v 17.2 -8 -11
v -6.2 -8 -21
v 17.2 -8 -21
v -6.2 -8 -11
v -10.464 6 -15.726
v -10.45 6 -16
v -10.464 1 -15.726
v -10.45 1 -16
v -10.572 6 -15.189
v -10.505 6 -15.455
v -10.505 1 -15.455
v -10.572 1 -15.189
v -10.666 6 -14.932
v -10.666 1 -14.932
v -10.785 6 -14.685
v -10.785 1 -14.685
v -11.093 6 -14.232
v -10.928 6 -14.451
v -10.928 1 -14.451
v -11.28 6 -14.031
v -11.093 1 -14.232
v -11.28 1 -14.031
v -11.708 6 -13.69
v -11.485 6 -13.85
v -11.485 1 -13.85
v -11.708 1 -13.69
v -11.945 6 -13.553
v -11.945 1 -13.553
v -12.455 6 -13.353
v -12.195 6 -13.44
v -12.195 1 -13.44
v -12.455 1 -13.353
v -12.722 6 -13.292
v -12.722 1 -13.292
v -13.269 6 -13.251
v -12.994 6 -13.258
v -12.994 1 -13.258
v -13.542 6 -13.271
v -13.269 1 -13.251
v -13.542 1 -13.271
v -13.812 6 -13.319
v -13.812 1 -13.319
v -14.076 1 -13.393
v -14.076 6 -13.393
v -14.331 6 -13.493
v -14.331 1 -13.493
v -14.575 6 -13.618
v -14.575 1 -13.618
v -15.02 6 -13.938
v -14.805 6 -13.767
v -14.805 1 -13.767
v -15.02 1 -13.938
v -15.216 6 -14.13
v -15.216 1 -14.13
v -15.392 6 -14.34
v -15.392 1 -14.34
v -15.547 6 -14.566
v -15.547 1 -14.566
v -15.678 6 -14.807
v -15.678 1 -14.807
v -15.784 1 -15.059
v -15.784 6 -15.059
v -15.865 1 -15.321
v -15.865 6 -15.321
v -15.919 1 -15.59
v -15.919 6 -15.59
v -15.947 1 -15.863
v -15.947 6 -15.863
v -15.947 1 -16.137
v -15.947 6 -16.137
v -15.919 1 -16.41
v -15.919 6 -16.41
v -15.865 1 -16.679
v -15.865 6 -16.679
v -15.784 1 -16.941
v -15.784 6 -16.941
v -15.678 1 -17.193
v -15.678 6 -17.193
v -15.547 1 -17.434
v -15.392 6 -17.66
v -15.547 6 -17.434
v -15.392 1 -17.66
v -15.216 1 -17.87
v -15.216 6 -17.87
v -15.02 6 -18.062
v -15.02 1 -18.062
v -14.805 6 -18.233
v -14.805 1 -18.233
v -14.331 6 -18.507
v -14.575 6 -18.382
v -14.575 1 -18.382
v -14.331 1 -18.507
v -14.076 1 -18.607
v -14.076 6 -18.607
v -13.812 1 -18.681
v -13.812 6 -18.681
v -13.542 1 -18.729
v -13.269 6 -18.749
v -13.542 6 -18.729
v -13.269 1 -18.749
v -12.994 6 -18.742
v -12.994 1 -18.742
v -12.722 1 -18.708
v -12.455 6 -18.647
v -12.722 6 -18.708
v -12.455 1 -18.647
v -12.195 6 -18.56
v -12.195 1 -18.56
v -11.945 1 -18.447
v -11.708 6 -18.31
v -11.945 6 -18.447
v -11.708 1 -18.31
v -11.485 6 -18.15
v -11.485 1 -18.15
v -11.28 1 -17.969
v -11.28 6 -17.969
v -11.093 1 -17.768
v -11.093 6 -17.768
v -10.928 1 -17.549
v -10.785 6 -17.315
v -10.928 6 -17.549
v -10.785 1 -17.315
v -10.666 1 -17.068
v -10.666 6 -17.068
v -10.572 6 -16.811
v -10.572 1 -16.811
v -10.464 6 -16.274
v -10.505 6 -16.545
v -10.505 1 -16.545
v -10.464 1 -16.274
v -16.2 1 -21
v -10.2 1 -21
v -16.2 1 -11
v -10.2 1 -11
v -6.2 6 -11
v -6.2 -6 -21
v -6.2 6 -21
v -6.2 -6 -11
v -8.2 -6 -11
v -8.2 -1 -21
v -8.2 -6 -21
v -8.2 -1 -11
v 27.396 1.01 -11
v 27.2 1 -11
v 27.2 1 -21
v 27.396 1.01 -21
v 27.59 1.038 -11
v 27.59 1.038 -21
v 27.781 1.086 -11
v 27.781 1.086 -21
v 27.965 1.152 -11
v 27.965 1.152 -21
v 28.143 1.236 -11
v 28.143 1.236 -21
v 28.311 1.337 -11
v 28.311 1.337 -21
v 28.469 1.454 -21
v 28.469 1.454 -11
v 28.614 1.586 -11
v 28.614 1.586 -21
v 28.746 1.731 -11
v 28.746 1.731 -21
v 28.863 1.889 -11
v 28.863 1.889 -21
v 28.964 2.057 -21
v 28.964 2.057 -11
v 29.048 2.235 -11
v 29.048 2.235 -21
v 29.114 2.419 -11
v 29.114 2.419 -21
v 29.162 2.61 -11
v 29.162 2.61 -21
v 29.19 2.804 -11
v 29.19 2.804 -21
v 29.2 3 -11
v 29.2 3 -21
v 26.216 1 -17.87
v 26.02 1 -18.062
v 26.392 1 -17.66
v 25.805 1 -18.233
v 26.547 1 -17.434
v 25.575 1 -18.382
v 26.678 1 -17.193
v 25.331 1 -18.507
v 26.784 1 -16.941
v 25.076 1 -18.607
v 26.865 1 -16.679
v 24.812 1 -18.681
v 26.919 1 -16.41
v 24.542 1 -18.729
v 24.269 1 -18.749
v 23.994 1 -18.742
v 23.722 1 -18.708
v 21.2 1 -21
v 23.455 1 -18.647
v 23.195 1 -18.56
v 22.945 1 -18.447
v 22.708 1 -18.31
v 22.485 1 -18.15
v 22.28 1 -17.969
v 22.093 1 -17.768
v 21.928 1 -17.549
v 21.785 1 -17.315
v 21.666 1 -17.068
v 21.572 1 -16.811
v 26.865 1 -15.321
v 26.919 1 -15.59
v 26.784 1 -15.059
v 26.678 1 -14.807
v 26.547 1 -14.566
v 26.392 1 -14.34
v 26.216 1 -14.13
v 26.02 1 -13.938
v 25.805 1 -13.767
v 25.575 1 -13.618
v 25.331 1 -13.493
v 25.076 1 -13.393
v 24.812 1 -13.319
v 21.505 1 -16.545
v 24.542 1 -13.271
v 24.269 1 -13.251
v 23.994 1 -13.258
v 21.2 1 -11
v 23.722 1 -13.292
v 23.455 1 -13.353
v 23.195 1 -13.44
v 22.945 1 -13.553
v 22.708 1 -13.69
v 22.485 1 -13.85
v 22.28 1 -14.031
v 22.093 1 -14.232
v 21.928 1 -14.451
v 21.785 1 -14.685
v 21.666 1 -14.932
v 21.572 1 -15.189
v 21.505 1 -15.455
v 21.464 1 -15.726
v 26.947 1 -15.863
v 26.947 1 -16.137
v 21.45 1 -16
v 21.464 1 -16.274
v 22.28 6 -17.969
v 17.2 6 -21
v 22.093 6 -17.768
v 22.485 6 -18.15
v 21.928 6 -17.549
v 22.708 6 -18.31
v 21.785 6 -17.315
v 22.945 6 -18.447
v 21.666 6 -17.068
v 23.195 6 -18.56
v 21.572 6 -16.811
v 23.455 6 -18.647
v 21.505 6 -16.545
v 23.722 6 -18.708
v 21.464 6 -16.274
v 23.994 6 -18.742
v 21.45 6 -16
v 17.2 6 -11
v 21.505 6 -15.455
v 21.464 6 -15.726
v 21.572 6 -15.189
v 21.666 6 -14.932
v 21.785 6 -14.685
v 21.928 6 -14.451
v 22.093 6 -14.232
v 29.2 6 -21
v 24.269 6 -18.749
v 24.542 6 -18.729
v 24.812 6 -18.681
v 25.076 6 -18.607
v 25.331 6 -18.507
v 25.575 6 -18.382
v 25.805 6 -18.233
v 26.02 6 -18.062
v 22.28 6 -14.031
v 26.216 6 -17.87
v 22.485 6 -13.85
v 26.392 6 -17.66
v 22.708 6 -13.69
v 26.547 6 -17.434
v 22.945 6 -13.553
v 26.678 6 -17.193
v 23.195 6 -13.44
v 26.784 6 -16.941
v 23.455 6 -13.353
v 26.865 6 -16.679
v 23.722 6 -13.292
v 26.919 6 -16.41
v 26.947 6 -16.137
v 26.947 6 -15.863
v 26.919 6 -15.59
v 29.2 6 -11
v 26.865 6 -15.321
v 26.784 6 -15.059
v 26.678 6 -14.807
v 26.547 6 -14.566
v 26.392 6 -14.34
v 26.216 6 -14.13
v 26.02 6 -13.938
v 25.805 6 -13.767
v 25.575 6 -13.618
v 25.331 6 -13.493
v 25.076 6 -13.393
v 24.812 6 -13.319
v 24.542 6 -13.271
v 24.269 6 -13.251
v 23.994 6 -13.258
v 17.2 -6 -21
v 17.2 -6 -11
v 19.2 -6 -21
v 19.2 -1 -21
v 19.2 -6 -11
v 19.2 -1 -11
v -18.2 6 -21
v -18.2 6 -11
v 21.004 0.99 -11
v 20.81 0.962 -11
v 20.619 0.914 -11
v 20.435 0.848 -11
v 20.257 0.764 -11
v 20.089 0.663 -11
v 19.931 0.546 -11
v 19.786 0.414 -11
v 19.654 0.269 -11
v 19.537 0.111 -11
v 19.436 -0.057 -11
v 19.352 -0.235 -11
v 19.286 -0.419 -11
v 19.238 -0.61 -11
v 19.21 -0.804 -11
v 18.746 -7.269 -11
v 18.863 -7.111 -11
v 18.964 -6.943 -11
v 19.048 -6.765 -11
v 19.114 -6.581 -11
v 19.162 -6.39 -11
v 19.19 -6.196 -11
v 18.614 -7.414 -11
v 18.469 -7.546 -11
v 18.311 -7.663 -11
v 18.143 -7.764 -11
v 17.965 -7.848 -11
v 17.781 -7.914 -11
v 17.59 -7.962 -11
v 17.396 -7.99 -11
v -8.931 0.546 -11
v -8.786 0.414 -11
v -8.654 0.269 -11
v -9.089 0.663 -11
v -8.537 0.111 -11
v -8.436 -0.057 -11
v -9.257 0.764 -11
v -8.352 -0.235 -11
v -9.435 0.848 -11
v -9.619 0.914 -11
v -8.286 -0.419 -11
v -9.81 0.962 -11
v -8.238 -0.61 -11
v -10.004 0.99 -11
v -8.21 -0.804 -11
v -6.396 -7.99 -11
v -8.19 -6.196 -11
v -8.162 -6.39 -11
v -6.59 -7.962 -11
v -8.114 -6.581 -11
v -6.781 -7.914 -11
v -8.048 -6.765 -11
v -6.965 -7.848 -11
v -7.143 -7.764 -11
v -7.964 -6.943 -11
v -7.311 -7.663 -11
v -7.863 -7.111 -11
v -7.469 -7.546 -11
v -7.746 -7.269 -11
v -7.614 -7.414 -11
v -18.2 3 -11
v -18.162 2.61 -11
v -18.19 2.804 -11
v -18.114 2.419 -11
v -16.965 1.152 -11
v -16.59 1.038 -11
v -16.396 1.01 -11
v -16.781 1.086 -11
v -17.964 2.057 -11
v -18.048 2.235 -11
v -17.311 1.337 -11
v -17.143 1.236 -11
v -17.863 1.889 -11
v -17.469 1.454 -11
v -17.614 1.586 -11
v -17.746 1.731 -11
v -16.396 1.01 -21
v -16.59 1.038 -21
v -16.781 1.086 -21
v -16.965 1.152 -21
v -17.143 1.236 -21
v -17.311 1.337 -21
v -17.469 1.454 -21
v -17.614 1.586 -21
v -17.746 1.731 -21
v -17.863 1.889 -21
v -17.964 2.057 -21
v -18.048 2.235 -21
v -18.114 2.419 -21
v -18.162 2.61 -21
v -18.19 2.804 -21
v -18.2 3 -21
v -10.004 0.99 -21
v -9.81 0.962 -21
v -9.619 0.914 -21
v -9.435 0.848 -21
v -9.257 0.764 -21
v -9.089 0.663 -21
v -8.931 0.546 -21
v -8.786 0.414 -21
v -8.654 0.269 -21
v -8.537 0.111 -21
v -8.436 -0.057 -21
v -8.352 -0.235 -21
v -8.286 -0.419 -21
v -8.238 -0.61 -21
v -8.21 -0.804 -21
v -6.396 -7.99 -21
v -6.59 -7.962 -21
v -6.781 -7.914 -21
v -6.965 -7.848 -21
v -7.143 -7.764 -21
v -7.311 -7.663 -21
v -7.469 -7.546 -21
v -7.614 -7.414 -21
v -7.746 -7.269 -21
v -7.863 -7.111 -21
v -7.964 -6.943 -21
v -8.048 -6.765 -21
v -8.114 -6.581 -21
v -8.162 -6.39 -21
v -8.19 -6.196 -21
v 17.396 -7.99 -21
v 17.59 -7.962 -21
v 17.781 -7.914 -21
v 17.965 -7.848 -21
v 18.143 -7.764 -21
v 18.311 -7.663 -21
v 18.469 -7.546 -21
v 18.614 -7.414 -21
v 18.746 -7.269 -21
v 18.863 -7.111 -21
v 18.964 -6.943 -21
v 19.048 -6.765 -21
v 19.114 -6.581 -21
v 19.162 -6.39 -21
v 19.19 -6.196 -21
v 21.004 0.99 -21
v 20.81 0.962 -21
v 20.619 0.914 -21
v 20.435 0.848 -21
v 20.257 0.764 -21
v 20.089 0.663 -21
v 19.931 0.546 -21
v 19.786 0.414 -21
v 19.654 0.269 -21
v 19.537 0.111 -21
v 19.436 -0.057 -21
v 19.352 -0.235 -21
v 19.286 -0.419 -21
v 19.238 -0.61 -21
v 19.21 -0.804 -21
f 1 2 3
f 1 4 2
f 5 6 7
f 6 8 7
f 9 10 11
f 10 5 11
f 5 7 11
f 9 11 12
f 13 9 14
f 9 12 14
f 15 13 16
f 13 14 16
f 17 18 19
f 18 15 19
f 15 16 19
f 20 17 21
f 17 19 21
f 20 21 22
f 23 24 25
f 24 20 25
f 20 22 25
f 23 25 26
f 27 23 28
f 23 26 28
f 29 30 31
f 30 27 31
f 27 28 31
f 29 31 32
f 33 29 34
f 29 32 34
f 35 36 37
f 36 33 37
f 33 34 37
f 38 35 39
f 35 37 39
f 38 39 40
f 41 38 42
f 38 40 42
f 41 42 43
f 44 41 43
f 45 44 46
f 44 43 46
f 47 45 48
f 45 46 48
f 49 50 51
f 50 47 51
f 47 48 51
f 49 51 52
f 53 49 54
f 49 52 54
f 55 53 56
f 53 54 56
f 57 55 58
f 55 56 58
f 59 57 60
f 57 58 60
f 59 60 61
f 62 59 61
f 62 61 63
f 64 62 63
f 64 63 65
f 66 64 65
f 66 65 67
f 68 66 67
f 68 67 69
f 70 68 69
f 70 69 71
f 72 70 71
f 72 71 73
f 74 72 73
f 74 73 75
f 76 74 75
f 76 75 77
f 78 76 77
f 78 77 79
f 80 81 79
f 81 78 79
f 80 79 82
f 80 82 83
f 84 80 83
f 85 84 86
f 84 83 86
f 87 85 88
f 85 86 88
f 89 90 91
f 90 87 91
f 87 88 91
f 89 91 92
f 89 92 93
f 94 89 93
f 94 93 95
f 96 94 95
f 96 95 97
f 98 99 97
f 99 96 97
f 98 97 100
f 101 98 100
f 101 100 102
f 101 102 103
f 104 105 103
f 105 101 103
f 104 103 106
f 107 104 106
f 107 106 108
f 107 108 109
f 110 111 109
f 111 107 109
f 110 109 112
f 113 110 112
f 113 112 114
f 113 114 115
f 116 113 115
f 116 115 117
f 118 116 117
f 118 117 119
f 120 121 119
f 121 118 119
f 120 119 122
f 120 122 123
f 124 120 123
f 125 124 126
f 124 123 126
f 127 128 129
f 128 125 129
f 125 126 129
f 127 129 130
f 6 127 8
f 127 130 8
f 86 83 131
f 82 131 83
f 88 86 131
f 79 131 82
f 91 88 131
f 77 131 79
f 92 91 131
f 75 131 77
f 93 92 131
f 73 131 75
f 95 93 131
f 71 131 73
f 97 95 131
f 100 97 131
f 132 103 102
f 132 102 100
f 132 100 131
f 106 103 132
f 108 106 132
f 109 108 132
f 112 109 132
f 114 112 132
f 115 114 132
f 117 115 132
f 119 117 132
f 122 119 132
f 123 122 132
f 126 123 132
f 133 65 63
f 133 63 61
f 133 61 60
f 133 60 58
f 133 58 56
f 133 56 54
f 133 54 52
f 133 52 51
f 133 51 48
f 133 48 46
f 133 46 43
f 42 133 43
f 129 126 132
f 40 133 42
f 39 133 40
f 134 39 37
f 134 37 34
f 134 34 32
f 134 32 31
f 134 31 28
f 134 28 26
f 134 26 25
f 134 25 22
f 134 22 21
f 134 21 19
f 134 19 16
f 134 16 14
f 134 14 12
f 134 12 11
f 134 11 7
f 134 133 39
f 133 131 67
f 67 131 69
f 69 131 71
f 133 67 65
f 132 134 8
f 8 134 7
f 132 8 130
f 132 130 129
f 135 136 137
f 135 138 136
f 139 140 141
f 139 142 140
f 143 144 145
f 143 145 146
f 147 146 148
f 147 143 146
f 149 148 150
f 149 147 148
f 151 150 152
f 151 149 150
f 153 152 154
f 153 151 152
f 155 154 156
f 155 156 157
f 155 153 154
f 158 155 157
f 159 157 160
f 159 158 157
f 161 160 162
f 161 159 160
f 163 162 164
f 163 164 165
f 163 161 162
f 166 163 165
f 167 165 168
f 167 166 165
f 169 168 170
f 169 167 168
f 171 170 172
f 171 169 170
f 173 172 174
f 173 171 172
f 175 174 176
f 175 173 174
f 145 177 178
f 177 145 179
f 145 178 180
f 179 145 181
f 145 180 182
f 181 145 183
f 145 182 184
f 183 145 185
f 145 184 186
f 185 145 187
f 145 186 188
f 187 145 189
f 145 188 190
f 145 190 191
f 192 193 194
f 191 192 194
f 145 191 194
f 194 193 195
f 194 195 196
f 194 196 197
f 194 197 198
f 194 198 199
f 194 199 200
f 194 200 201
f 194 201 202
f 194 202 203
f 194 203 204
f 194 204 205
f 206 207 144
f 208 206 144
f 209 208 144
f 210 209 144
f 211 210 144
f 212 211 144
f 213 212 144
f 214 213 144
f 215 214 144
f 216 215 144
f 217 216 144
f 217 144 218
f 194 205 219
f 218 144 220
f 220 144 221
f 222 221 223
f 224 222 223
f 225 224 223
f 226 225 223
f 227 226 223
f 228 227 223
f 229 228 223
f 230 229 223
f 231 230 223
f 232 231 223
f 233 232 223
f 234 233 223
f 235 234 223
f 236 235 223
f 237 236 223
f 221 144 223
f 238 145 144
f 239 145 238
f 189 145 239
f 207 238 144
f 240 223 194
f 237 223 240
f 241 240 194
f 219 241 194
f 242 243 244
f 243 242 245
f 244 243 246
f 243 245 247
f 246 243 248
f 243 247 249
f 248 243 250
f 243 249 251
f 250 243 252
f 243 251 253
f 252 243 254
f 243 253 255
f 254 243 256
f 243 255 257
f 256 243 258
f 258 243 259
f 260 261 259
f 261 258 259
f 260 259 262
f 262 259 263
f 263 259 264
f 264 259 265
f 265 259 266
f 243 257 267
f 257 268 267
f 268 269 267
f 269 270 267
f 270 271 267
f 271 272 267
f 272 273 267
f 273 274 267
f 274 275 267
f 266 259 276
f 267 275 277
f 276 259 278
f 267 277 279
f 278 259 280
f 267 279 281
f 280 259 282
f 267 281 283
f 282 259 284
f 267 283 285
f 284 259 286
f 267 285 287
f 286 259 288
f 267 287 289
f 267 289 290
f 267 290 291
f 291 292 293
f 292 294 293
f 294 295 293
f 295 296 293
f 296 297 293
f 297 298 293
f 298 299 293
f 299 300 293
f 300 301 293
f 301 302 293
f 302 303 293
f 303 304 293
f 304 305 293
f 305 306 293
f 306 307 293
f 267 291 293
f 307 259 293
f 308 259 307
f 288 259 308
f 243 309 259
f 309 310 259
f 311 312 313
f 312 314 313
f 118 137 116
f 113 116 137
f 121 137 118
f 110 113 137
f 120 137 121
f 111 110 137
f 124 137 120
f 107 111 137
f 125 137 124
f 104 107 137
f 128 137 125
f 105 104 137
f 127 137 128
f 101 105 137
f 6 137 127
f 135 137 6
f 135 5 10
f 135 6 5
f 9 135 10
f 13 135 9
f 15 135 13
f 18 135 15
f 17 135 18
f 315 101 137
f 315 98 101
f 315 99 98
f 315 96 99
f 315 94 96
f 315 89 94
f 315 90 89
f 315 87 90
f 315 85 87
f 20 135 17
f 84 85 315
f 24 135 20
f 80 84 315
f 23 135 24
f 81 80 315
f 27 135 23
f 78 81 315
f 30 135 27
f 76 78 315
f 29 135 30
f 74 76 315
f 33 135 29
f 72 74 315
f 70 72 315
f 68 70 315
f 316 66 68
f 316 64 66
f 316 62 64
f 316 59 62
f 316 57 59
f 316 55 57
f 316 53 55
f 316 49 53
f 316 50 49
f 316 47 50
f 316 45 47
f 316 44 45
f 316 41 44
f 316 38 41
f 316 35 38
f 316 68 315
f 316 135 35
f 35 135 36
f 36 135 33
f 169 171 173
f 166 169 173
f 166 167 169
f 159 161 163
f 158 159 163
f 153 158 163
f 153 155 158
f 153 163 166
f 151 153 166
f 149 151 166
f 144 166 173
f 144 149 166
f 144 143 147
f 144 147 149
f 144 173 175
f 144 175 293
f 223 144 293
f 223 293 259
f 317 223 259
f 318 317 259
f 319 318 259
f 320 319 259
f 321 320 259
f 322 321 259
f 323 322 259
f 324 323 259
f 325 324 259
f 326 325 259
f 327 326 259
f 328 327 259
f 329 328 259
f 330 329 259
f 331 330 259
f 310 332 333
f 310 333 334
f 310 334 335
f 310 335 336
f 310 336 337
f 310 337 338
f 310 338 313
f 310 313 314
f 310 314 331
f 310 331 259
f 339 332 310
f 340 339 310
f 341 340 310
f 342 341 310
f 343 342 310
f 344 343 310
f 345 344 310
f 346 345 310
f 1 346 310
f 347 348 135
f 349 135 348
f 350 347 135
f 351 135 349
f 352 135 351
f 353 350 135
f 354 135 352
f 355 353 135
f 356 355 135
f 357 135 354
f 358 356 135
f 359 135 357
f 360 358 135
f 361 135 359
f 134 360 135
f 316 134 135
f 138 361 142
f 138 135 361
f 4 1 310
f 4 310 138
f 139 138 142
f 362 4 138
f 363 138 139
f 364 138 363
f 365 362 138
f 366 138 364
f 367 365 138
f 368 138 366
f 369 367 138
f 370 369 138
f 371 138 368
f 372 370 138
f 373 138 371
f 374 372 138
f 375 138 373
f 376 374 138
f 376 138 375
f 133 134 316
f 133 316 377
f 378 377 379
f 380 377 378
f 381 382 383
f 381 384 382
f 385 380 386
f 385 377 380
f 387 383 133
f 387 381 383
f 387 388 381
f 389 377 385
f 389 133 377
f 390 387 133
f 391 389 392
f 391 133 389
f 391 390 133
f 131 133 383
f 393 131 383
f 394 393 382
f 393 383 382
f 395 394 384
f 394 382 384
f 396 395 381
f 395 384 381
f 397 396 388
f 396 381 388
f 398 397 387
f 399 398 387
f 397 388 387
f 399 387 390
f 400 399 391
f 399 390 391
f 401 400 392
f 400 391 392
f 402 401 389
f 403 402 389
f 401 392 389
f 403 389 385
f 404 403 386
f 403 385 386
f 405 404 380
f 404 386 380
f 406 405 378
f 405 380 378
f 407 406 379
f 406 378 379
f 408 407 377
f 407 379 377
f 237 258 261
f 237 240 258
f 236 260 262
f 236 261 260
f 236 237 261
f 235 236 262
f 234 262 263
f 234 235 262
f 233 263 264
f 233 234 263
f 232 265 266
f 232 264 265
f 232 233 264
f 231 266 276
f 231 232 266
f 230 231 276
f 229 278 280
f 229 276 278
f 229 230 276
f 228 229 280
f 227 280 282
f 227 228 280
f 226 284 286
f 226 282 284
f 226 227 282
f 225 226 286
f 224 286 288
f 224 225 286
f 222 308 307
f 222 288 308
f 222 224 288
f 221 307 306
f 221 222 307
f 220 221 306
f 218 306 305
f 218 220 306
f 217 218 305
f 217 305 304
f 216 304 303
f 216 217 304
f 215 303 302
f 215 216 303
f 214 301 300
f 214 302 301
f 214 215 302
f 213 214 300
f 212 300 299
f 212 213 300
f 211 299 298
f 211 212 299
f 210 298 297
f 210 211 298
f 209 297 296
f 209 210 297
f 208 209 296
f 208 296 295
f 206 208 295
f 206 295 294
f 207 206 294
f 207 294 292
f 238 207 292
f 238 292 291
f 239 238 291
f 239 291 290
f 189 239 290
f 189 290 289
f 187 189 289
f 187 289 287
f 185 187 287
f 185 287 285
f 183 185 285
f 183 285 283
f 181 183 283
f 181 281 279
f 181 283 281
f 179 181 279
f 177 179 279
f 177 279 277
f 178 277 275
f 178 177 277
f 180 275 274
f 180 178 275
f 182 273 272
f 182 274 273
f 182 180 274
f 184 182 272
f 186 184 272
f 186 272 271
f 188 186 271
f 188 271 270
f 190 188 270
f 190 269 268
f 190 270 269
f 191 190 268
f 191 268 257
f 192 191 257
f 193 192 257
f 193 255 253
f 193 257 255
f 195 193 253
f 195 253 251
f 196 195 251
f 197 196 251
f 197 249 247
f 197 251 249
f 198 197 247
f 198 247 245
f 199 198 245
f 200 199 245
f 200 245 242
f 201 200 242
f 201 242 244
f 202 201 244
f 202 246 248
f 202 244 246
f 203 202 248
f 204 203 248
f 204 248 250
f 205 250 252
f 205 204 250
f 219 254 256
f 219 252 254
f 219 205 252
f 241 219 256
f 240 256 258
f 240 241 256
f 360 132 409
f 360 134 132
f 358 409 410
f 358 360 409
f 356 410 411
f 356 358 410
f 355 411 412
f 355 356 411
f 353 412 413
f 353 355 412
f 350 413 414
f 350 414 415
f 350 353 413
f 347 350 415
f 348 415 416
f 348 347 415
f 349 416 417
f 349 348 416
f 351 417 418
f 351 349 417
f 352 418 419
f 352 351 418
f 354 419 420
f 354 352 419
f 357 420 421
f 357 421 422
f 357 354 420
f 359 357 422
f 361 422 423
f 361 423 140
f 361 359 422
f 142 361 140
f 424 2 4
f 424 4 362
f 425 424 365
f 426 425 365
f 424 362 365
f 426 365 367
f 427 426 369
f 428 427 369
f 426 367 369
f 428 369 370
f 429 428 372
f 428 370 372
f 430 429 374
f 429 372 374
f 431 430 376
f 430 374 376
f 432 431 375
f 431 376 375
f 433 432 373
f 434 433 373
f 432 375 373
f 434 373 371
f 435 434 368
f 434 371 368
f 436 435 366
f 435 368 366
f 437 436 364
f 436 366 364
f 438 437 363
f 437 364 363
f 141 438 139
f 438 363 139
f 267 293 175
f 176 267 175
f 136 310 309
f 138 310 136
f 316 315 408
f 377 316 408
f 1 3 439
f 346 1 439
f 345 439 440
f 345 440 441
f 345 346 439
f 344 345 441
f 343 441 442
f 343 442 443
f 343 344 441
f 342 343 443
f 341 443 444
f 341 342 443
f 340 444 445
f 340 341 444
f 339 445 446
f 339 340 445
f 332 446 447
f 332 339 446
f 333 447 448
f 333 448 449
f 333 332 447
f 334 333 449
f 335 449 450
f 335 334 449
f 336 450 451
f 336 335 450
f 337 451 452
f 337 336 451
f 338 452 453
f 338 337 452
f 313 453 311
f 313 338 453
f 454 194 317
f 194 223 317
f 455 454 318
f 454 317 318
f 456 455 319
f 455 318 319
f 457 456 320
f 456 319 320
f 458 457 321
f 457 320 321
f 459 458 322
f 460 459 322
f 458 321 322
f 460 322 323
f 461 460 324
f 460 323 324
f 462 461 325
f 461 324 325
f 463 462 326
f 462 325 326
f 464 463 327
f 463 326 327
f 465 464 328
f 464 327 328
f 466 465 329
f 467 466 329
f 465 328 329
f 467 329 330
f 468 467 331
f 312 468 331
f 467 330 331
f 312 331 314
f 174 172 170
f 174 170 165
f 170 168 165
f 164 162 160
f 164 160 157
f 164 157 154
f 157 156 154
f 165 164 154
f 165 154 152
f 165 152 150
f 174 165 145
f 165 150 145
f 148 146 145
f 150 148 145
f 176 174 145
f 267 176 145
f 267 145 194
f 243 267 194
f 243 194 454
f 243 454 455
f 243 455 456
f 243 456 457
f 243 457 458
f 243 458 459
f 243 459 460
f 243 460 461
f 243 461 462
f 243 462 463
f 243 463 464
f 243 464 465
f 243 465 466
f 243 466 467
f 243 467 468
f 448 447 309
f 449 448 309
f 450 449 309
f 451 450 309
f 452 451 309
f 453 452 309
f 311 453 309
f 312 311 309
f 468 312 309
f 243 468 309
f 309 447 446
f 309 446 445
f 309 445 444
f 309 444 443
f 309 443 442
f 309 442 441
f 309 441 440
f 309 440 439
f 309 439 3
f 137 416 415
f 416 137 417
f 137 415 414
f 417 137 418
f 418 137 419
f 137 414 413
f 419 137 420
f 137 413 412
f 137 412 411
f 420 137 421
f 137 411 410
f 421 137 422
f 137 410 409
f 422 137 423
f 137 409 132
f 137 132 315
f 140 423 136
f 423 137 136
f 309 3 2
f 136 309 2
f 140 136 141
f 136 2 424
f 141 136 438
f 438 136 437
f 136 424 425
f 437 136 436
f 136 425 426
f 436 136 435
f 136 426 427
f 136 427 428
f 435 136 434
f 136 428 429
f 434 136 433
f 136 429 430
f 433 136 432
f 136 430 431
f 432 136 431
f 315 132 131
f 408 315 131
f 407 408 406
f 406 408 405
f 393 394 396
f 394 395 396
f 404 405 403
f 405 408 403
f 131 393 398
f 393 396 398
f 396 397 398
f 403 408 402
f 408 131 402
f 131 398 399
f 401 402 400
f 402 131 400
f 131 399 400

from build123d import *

# Parameters (mm, degrees)
PAD053_DEPTH            = 5
SKETCH104_R             = 2.75
POCKET052_DEPTH         = 8.001
POCKET052_DEPTH_BACK    = 6.001
BODY032_PLACEMENT_ANGLE = 180


with BuildPart() as part:
    # Sketch103 → Pad053 (new body, symmetric)
    with BuildSketch(Plane(origin=(6, -6, 0), x_dir=(1, 0, 0), z_dir=(0, 0, 1))):
        with BuildLine():
            Line((-21.7, 5), (-15.7, 5))
            ThreePointArc((-15.7, 5), (-14.2857864376, 5.5857864376), (-13.7, 7))
            Line((-13.7, 7), (-13.7, 12))
            ThreePointArc((-11.7, 14), (-13.1142135624, 13.4142135624), (-13.7, 12))
            Line((-11.7, 14), (0, 14))
            Line((0, 14), (0, 12))
            Line((0, 12), (-11.7, 12))
            Line((-11.7, 12), (-11.7, 0))
            Line((-11.7, 0), (-23.7, 0))
            Line((-23.7, 0), (-23.7, 3))
            ThreePointArc((-21.7, 5), (-23.1142135624, 4.4142135624), (-23.7, 3))
        make_face()
    extrude(amount=PAD053_DEPTH, both=True)

    # Sketch104 → Pocket052 (cut, two sides)
    with BuildSketch(Plane.XZ) as pocket052_sk:
        with Locations((-12.7, 0)):
            Circle(SKETCH104_R)
    extrude(amount=-POCKET052_DEPTH, mode=Mode.SUBTRACT)
    extrude(pocket052_sk.sketch, amount=POCKET052_DEPTH_BACK, mode=Mode.SUBTRACT)

    # Mirrored024: part across Sketch103 V_Axis


with BuildPart() as part_1:
    add(part.part)
    add(part.part.mirror(Plane(origin=(6, -6, 0), x_dir=(0, 0, 1), z_dir=(1, 0, 0))))


with BuildPart() as part_2:
    # Body032 placement: moved
    add(part_1.part.moved(Location((11.5, 0, -16))).rotate(Axis((11.5, 0, -16), (0, 0, 1)), BODY032_PLACEMENT_ANGLE))


solid = part_2.part
